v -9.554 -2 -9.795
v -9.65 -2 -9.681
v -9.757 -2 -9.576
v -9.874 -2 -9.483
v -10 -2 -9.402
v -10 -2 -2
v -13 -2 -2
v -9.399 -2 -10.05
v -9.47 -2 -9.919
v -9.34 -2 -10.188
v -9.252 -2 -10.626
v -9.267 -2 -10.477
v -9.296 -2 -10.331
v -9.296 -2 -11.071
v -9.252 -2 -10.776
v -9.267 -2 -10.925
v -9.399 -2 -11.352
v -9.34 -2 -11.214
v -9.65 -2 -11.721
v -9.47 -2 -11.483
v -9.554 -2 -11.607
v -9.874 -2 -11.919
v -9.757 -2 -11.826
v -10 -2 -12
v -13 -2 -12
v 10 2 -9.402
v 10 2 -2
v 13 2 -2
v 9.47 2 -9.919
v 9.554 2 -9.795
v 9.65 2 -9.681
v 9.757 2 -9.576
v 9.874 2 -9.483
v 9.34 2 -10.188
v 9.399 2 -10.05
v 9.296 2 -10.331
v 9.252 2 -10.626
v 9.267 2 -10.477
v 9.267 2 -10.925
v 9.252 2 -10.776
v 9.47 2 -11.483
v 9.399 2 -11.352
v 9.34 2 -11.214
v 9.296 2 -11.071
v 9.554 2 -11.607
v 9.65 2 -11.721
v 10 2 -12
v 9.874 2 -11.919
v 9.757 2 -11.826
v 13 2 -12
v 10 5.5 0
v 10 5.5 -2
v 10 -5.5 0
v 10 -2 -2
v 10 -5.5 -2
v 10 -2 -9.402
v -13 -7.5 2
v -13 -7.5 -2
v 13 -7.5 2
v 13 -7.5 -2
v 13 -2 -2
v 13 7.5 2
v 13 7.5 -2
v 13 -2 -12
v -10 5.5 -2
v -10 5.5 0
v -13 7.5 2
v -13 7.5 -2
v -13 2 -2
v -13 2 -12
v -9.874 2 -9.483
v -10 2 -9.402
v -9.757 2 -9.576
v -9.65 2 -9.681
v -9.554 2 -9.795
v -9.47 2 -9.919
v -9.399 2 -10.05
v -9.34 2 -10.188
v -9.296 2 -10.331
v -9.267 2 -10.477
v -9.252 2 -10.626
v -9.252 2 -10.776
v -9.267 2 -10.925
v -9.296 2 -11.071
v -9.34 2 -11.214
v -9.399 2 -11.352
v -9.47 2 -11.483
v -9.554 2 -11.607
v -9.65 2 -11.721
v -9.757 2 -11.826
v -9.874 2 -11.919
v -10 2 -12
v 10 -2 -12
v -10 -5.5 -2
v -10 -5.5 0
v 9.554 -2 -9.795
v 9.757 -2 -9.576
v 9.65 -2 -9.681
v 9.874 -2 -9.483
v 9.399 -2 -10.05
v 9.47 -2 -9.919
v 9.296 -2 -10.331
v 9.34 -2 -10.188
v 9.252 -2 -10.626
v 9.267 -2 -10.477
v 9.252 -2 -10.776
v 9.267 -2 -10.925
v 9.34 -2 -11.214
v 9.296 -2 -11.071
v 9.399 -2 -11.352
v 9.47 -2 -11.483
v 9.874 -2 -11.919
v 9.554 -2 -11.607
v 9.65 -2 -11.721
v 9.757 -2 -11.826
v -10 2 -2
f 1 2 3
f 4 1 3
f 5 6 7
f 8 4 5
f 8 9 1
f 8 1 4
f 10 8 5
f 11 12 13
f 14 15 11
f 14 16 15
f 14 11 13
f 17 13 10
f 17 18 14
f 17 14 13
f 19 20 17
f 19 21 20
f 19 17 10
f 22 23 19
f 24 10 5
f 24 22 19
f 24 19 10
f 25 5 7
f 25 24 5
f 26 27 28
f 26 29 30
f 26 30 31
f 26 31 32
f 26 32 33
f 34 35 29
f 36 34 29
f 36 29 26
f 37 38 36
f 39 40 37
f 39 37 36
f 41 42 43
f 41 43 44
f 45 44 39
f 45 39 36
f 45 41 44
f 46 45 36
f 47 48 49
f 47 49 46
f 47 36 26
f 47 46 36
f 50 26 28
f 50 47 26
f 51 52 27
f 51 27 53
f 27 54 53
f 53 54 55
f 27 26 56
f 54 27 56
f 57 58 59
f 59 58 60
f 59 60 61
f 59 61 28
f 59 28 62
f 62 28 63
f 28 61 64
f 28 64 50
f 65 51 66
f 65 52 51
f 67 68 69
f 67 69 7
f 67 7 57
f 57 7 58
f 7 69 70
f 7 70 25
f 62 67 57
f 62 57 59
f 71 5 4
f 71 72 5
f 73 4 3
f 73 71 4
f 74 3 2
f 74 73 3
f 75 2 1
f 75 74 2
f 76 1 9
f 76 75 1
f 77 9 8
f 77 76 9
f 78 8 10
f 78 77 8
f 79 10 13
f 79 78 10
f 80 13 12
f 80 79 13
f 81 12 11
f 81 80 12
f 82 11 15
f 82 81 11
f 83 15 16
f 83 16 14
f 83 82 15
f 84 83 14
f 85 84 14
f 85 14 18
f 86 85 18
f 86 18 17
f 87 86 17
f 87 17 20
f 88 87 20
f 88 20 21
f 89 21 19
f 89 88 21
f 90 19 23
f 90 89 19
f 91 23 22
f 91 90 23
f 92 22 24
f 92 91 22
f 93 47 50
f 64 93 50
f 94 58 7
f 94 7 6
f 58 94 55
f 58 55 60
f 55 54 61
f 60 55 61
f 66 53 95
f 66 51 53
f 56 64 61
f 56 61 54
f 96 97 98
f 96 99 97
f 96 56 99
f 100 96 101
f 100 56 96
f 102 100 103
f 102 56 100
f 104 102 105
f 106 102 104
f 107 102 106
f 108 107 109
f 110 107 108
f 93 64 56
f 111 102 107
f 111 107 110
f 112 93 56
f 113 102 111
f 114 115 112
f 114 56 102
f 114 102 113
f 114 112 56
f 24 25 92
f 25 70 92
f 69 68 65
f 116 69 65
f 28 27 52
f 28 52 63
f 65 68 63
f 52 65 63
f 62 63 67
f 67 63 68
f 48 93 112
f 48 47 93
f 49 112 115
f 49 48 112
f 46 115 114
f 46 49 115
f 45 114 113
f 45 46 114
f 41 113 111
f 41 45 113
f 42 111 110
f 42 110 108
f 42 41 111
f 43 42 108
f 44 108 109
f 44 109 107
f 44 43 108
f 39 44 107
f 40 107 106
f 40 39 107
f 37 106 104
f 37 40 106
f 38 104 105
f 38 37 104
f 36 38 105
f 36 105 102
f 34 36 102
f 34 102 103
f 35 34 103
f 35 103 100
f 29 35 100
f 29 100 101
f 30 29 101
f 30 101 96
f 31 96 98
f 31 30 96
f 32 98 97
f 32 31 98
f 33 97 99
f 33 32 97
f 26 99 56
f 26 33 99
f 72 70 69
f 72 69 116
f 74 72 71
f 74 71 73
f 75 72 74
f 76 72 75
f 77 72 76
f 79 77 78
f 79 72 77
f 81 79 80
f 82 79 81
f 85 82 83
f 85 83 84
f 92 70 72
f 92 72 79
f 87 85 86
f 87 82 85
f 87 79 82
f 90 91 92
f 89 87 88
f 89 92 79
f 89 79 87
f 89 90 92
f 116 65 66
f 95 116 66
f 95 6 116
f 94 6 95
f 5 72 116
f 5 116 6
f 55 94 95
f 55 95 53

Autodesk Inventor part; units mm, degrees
ref_plane "YZ Plane" through (0, 0, 0) normal (1, 0, 0) x (0, 1, 0)
ref_plane "XZ Plane" through (0, 0, 0) normal (0, 1, 0) x (-1, 0, 0)
ref_plane "XY Plane" through (0, 0, 0) normal (0, 0, 1) x (1, 0, 0)
sketch "Sketch2" plane through (0, 0, 0) normal (0, 0, 1) x (1, 0, 0)
  line L0 (-13, -7.5) -> (13, -7.5)
  line L1 (13, -7.5) -> (13, 7.5)
  line L2 (13, 7.5) -> (-13, 7.5)
  line L3 (-13, 7.5) -> (-13, -7.5)
  line L4 (-13, -7.5) -> (13, 7.5) construction
  line L5 (13, -7.5) -> (-13, 7.5) construction
  line L6 (-13, 2) -> (-10, 2)
  line L7 (-10, 2) -> (-10, -2)
  line L8 (-10, -2) -> (-13, -2)
  line L9 (0, 7.5) -> (0, -7.5) construction
  line L10 (13, -2) -> (10, -2)
  line L11 (10, -2) -> (10, 2)
  line L12 (10, 2) -> (13, 2)
  point P0 (0, 0)
  point P1 (0, 0)
  point P2 (-10, 0)
  point P3 (10, 0)
  dimension "d0" = 26
  dimension "d3" = 15
  dimension "d7" = 4
  dimension "d17" = 3
extrude "Extrusion1" add sketch "Sketch2" along normal mid plane 4
sketch "Sketch3" plane through (0, 0, -2) normal (0, 0, -1) x (-1, 0, 0)
  line L0 (-13, -7.5) -> (13, -7.5) projected
  line L1 (13, -7.5) -> (13, 7.5) projected
  line L2 (13, 7.5) -> (-13, 7.5) projected
  line L3 (-13, 7.5) -> (-13, -7.5) projected
  line L4 (-10, 5.5) -> (10, 5.5)
  line L5 (10, -5.5) -> (-10, -5.5)
  line L6 (-10, 5.5) -> (-10, -5.5)
  line L7 (10, 5.5) -> (10, -5.5)
  point P0 (0, 0)
  dimension "d4" = 2
  dimension "d18" = 2
  dimension "d19" = 3
  dimension "d20" = 3
extrude "Extrusion2" cut sketch "Sketch3" against normal blind 2 contours L4 L7 L5 L6
extrude "Extrusion3" add sketch "Sketch2" along normal blind 2 and the other way blind 12 contours L3 L6 L7 L8 | L10 L11 L12 L1
sketch "Sketch4" plane through (13, 2, 2) normal (0, 1, 0) x (1, 0, 0)
  line L0 (-3, 4.007) -> (-3, 14)
  arc A0 (-3, 14) -> (-3, 11.4019) centre (-2.25, 12.701) ccw
  line L1 (-3, 11.4019) -> (-3, 14)
  line L2 (-13, 2) -> (-13, 0) construction
  line L3 (-26, 0) -> (0, 0) construction
  line L4 (-23, 14) -> (-23, 4.007)
  arc A1 (-23, 11.4019) -> (-23, 14) centre (-23.75, 12.701) ccw
  line L5 (-3, 4) -> (-3, 14) projected
  dimension "d13" = 1.5
  dimension "d14" = 0.75
extrude "Extrusion4" add sketch "Sketch4" against normal blind 4
equation "\"d18\" = d4"
equation "\"d20\" = d19"
properties part number "Cover"
